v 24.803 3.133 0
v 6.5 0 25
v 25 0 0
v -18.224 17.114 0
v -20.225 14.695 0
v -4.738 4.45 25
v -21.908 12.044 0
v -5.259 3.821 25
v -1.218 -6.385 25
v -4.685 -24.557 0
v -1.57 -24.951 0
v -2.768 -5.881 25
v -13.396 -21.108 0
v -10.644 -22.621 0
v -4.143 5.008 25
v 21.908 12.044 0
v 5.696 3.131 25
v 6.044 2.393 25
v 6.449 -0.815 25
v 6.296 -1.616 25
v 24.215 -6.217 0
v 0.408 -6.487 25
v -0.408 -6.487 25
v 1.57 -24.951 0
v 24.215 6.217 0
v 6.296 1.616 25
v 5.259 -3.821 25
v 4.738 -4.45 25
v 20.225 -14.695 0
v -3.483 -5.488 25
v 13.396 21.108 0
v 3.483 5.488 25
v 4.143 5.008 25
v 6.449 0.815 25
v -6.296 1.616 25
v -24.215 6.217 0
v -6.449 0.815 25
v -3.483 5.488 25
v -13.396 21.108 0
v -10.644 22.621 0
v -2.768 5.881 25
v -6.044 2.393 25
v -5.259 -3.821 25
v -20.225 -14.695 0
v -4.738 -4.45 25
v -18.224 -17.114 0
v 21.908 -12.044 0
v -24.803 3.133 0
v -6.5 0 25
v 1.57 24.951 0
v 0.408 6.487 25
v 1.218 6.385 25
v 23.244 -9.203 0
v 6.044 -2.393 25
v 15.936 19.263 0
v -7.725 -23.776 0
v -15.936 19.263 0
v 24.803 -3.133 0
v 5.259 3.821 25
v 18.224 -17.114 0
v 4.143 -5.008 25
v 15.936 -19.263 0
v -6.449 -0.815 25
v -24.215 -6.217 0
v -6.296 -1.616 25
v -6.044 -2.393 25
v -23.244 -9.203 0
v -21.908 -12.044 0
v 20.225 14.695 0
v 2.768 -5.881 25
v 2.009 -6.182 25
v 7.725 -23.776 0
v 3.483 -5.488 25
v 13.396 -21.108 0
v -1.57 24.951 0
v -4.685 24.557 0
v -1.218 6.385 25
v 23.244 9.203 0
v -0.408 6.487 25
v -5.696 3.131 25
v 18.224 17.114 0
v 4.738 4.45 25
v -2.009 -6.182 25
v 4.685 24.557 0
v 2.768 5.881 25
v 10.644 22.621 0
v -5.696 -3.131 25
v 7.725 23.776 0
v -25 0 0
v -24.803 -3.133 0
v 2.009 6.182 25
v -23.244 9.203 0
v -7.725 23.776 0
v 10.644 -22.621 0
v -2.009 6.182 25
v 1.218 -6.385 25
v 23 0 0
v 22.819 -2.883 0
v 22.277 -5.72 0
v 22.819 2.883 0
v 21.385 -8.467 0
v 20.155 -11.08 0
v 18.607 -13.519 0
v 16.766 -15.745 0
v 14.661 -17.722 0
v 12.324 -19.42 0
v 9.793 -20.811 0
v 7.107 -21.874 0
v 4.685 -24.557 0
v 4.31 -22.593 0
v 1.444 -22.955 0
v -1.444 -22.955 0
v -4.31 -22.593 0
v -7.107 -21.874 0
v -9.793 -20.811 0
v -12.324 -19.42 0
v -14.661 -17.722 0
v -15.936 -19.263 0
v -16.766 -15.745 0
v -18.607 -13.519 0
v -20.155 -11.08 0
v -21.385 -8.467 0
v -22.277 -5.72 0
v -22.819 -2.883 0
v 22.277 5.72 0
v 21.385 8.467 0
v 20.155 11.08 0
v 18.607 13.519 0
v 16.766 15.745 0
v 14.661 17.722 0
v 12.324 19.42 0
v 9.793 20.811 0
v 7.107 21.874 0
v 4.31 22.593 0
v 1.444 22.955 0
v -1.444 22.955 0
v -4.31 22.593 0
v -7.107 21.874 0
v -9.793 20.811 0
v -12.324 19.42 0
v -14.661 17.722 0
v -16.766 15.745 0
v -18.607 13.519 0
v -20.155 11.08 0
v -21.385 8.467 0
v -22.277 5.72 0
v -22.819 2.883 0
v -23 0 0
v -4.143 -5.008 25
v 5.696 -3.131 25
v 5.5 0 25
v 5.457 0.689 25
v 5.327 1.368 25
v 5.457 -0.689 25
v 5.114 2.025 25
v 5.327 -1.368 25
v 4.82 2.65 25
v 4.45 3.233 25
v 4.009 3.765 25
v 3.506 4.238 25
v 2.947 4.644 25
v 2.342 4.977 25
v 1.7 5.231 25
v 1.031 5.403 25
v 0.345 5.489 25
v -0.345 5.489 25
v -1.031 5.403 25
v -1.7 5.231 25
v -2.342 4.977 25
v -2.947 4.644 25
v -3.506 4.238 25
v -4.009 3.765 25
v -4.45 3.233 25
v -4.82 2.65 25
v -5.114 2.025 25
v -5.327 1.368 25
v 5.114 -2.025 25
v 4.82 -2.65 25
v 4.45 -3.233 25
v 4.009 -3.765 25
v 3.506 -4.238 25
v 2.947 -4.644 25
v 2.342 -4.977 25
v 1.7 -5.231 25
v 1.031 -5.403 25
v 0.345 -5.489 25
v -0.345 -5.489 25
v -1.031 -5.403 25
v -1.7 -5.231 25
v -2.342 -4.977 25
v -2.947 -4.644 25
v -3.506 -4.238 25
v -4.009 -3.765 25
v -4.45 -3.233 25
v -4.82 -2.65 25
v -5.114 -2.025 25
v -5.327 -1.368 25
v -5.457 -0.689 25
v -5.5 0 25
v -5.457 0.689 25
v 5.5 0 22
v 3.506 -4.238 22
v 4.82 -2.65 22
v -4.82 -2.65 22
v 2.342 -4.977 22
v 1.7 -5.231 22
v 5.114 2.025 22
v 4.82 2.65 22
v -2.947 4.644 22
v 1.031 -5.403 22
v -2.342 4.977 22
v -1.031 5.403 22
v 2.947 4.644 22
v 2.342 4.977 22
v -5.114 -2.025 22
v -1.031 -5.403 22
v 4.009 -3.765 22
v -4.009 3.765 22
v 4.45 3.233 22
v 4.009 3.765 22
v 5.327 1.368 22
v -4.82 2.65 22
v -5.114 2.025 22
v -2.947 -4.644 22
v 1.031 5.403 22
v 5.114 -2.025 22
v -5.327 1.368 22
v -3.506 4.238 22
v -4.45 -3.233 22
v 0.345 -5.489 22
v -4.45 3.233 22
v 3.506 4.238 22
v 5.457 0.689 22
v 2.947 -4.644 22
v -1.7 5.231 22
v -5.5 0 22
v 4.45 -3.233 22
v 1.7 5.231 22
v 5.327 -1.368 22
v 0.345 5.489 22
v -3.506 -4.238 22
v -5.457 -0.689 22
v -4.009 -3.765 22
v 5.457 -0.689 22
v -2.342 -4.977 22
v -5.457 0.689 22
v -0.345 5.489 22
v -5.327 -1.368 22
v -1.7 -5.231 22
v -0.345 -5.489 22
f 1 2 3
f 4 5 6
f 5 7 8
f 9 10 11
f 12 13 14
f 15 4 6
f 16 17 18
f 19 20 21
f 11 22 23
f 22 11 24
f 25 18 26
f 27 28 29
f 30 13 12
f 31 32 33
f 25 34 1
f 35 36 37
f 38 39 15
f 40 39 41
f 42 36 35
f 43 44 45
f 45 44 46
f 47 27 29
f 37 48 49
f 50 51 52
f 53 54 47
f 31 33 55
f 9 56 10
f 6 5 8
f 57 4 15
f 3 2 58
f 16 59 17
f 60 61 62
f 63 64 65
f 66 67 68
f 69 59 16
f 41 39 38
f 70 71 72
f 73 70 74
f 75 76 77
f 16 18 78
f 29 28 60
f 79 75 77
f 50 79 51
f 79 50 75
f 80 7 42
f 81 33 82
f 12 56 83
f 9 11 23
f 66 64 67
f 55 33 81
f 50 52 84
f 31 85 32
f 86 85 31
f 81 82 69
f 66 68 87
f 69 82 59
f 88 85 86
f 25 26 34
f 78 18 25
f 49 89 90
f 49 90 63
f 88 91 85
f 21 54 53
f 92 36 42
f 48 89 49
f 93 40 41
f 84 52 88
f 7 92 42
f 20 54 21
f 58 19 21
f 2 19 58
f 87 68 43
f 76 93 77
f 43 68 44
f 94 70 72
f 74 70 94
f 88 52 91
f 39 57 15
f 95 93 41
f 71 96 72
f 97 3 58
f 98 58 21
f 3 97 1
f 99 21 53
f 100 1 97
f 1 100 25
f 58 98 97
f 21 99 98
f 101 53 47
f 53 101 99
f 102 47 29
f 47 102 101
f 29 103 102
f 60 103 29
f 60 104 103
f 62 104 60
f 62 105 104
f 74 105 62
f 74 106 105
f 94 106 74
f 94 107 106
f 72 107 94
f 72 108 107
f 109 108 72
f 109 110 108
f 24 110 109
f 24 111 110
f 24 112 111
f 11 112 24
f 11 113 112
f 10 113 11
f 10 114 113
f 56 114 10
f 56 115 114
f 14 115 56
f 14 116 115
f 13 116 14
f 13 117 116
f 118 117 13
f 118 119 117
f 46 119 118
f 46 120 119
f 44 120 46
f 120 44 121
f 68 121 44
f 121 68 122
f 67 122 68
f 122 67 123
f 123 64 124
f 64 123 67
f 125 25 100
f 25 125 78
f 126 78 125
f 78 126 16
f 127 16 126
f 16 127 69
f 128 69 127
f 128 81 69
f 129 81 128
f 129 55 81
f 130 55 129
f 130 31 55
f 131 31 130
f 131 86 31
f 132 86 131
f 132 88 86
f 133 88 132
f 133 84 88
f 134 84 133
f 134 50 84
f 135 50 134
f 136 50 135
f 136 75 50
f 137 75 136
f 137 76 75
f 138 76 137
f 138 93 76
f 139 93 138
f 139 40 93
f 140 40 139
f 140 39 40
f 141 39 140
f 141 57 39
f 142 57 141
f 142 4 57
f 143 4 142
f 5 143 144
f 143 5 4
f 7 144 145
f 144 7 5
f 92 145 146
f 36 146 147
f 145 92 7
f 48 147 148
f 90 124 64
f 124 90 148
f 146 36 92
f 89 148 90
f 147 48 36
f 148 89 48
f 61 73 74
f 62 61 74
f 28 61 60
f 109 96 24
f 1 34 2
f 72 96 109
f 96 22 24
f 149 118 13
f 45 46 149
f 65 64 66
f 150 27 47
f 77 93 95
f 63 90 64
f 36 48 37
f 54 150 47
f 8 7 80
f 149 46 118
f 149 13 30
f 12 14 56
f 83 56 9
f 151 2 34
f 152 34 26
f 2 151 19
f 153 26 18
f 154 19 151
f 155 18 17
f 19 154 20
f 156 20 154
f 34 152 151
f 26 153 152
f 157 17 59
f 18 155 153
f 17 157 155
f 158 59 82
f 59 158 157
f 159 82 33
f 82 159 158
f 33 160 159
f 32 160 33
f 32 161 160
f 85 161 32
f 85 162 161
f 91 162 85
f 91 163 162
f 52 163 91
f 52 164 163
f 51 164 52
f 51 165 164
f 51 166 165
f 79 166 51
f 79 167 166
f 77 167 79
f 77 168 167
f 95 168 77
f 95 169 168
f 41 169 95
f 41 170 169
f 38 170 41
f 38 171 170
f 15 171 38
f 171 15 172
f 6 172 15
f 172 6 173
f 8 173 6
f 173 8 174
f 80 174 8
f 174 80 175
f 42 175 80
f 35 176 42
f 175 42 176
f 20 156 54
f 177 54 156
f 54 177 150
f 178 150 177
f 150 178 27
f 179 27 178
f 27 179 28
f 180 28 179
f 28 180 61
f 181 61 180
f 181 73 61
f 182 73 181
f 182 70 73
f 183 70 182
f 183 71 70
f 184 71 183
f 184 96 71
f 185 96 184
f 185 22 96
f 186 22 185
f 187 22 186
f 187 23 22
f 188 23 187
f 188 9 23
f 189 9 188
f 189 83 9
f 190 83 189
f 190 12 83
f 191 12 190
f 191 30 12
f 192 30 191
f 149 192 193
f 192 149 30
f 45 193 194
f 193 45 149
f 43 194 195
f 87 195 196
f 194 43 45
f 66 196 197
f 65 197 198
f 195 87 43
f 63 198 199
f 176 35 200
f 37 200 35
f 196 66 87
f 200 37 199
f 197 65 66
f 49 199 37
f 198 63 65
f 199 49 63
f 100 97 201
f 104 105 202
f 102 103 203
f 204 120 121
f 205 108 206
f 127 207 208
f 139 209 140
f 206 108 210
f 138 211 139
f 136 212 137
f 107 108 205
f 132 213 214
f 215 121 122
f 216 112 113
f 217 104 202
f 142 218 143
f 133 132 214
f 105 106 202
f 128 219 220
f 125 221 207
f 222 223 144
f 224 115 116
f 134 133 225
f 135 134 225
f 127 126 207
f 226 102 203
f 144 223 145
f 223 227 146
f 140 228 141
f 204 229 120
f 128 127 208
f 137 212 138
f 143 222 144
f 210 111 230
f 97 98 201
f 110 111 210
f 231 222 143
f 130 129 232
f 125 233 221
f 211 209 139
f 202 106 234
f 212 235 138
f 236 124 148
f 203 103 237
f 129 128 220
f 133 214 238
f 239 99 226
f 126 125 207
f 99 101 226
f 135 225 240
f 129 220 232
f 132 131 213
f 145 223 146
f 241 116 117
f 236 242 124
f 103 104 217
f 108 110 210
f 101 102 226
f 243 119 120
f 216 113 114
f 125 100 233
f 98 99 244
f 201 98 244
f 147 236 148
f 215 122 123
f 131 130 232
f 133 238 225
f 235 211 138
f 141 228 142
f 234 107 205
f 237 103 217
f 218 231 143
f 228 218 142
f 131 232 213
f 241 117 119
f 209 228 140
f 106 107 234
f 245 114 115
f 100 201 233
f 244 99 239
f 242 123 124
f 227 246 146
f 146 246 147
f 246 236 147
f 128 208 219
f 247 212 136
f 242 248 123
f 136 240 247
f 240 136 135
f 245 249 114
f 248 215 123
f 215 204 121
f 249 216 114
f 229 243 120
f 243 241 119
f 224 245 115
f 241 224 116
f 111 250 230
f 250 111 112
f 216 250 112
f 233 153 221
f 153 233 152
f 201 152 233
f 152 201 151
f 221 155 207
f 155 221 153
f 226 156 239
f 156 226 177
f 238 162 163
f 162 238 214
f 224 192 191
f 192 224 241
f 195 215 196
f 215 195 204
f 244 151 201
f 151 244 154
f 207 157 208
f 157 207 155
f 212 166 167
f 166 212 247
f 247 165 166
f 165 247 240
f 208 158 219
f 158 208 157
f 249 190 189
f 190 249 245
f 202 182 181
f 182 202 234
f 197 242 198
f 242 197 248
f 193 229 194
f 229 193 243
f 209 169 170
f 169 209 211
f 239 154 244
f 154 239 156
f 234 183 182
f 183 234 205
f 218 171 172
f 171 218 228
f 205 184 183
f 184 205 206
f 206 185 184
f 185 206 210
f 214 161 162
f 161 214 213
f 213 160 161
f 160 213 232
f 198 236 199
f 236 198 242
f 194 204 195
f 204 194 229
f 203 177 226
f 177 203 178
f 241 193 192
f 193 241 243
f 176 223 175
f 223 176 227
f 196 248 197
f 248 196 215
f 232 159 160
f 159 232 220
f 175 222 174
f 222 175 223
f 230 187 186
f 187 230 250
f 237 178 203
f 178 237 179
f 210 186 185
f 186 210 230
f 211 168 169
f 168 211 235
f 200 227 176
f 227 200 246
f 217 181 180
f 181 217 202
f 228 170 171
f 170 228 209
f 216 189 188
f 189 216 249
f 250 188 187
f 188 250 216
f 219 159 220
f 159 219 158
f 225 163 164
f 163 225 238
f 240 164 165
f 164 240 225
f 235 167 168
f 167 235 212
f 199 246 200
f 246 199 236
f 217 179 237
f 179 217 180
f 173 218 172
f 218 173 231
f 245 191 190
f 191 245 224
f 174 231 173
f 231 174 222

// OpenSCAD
$fn=50;

module ring(r1, r2) {
    rotate_extrude() translate([r1,0,0]) circle(r2);
}

translate(0, 0, 26) ring(2, 12);
difference() {
    union() {
        cylinder(h=25, d1=50, d2=13);
    }
    cylinder(h=22, d1=46, d2=11);
    cylinder(h=25, d=11);
 }
    
